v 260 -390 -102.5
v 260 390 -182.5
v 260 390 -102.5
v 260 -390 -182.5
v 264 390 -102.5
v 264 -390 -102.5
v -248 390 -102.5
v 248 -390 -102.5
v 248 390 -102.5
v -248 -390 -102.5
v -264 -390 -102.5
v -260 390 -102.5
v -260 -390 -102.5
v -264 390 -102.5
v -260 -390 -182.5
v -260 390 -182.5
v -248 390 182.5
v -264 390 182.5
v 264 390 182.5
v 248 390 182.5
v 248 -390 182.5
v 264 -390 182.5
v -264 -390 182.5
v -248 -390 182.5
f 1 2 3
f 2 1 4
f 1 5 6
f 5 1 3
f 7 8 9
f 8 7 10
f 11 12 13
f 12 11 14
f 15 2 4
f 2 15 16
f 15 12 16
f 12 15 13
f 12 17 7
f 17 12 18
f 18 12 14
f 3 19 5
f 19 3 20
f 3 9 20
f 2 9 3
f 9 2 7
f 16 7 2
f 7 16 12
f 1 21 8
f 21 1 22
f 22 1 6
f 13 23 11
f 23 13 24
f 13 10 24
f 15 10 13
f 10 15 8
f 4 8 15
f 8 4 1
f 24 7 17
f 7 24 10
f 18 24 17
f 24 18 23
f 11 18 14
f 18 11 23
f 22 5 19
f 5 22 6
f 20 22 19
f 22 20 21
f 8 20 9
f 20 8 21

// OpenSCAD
// ============================================================================
// Atom Lithography Machine — Parametric OpenSCAD Module (S9.HPC-03)
// ============================================================================
// part_id           : S9.HPC-03
// parent_bom_id     : S9.HPC
// subsystem         : S9
// part_name         : Yedekli 2.6 kW Titanium PSU Paketi, Surgulu Raf Raylari & ZU48DR 100G CMAC RDMA Entegrasyon Kiti (Exp143, 3.80 kg)
// material          : Steel
// temp_stage        : 300 K (HPC rafi)
// vacuum_grade      : Atmosfer
// tolerance         : 99.99% yedekli PSU
// computed_mass_kg  : 3.80000
// envelope_mm       : 556.000 x 780.000 x 365.200
// design_maturity   : M0_M1_DETAILED_CAD_DESIGN_ONLY
// no_lab_measurement: true
// iec61508_certified: false
// semi_s2_certified : false
// Units: millimeters (mm)
// ============================================================================

$fn = 64;

// Nominal bounding envelope parameters (mm)
bbox_x = 556.0000;
bbox_y = 780.0000;
bbox_z = 365.2000;

// Part-specific parametric dimensions
psu_kw = 2.6;
rail_depth_mm = 780.0;
om4_bend_r_mm = 45.0;

// Interface / port parameters (mm)
port_om4_fiber_duct_entry_od = 28.000;
port_om4_fiber_duct_entry_bore = 18.000;

module part_S9_HPC_03() {
  union() {
    // 2.6 kW redundant Titanium PSU plinth
    translate([0.000, 0.000, -142.500]) cube([520.000, 780.000, 80.000], center=true);
    // Left sliding rail assembly
    translate([-256.000, 0.000, 40.000]) cube([16.000, 780.000, 285.000], center=true);
    // Right sliding rail assembly
    translate([256.000, 0.000, 40.000]) cube([16.000, 780.000, 285.000], center=true);
  }
}

// World assembly mounting transform (global machine frame, mm / deg):
// translate([2750.000, -700.000, 182.500]) rotate([0.000, 0.000, 0.000]) part_S9_HPC_03();

part_S9_HPC_03();
